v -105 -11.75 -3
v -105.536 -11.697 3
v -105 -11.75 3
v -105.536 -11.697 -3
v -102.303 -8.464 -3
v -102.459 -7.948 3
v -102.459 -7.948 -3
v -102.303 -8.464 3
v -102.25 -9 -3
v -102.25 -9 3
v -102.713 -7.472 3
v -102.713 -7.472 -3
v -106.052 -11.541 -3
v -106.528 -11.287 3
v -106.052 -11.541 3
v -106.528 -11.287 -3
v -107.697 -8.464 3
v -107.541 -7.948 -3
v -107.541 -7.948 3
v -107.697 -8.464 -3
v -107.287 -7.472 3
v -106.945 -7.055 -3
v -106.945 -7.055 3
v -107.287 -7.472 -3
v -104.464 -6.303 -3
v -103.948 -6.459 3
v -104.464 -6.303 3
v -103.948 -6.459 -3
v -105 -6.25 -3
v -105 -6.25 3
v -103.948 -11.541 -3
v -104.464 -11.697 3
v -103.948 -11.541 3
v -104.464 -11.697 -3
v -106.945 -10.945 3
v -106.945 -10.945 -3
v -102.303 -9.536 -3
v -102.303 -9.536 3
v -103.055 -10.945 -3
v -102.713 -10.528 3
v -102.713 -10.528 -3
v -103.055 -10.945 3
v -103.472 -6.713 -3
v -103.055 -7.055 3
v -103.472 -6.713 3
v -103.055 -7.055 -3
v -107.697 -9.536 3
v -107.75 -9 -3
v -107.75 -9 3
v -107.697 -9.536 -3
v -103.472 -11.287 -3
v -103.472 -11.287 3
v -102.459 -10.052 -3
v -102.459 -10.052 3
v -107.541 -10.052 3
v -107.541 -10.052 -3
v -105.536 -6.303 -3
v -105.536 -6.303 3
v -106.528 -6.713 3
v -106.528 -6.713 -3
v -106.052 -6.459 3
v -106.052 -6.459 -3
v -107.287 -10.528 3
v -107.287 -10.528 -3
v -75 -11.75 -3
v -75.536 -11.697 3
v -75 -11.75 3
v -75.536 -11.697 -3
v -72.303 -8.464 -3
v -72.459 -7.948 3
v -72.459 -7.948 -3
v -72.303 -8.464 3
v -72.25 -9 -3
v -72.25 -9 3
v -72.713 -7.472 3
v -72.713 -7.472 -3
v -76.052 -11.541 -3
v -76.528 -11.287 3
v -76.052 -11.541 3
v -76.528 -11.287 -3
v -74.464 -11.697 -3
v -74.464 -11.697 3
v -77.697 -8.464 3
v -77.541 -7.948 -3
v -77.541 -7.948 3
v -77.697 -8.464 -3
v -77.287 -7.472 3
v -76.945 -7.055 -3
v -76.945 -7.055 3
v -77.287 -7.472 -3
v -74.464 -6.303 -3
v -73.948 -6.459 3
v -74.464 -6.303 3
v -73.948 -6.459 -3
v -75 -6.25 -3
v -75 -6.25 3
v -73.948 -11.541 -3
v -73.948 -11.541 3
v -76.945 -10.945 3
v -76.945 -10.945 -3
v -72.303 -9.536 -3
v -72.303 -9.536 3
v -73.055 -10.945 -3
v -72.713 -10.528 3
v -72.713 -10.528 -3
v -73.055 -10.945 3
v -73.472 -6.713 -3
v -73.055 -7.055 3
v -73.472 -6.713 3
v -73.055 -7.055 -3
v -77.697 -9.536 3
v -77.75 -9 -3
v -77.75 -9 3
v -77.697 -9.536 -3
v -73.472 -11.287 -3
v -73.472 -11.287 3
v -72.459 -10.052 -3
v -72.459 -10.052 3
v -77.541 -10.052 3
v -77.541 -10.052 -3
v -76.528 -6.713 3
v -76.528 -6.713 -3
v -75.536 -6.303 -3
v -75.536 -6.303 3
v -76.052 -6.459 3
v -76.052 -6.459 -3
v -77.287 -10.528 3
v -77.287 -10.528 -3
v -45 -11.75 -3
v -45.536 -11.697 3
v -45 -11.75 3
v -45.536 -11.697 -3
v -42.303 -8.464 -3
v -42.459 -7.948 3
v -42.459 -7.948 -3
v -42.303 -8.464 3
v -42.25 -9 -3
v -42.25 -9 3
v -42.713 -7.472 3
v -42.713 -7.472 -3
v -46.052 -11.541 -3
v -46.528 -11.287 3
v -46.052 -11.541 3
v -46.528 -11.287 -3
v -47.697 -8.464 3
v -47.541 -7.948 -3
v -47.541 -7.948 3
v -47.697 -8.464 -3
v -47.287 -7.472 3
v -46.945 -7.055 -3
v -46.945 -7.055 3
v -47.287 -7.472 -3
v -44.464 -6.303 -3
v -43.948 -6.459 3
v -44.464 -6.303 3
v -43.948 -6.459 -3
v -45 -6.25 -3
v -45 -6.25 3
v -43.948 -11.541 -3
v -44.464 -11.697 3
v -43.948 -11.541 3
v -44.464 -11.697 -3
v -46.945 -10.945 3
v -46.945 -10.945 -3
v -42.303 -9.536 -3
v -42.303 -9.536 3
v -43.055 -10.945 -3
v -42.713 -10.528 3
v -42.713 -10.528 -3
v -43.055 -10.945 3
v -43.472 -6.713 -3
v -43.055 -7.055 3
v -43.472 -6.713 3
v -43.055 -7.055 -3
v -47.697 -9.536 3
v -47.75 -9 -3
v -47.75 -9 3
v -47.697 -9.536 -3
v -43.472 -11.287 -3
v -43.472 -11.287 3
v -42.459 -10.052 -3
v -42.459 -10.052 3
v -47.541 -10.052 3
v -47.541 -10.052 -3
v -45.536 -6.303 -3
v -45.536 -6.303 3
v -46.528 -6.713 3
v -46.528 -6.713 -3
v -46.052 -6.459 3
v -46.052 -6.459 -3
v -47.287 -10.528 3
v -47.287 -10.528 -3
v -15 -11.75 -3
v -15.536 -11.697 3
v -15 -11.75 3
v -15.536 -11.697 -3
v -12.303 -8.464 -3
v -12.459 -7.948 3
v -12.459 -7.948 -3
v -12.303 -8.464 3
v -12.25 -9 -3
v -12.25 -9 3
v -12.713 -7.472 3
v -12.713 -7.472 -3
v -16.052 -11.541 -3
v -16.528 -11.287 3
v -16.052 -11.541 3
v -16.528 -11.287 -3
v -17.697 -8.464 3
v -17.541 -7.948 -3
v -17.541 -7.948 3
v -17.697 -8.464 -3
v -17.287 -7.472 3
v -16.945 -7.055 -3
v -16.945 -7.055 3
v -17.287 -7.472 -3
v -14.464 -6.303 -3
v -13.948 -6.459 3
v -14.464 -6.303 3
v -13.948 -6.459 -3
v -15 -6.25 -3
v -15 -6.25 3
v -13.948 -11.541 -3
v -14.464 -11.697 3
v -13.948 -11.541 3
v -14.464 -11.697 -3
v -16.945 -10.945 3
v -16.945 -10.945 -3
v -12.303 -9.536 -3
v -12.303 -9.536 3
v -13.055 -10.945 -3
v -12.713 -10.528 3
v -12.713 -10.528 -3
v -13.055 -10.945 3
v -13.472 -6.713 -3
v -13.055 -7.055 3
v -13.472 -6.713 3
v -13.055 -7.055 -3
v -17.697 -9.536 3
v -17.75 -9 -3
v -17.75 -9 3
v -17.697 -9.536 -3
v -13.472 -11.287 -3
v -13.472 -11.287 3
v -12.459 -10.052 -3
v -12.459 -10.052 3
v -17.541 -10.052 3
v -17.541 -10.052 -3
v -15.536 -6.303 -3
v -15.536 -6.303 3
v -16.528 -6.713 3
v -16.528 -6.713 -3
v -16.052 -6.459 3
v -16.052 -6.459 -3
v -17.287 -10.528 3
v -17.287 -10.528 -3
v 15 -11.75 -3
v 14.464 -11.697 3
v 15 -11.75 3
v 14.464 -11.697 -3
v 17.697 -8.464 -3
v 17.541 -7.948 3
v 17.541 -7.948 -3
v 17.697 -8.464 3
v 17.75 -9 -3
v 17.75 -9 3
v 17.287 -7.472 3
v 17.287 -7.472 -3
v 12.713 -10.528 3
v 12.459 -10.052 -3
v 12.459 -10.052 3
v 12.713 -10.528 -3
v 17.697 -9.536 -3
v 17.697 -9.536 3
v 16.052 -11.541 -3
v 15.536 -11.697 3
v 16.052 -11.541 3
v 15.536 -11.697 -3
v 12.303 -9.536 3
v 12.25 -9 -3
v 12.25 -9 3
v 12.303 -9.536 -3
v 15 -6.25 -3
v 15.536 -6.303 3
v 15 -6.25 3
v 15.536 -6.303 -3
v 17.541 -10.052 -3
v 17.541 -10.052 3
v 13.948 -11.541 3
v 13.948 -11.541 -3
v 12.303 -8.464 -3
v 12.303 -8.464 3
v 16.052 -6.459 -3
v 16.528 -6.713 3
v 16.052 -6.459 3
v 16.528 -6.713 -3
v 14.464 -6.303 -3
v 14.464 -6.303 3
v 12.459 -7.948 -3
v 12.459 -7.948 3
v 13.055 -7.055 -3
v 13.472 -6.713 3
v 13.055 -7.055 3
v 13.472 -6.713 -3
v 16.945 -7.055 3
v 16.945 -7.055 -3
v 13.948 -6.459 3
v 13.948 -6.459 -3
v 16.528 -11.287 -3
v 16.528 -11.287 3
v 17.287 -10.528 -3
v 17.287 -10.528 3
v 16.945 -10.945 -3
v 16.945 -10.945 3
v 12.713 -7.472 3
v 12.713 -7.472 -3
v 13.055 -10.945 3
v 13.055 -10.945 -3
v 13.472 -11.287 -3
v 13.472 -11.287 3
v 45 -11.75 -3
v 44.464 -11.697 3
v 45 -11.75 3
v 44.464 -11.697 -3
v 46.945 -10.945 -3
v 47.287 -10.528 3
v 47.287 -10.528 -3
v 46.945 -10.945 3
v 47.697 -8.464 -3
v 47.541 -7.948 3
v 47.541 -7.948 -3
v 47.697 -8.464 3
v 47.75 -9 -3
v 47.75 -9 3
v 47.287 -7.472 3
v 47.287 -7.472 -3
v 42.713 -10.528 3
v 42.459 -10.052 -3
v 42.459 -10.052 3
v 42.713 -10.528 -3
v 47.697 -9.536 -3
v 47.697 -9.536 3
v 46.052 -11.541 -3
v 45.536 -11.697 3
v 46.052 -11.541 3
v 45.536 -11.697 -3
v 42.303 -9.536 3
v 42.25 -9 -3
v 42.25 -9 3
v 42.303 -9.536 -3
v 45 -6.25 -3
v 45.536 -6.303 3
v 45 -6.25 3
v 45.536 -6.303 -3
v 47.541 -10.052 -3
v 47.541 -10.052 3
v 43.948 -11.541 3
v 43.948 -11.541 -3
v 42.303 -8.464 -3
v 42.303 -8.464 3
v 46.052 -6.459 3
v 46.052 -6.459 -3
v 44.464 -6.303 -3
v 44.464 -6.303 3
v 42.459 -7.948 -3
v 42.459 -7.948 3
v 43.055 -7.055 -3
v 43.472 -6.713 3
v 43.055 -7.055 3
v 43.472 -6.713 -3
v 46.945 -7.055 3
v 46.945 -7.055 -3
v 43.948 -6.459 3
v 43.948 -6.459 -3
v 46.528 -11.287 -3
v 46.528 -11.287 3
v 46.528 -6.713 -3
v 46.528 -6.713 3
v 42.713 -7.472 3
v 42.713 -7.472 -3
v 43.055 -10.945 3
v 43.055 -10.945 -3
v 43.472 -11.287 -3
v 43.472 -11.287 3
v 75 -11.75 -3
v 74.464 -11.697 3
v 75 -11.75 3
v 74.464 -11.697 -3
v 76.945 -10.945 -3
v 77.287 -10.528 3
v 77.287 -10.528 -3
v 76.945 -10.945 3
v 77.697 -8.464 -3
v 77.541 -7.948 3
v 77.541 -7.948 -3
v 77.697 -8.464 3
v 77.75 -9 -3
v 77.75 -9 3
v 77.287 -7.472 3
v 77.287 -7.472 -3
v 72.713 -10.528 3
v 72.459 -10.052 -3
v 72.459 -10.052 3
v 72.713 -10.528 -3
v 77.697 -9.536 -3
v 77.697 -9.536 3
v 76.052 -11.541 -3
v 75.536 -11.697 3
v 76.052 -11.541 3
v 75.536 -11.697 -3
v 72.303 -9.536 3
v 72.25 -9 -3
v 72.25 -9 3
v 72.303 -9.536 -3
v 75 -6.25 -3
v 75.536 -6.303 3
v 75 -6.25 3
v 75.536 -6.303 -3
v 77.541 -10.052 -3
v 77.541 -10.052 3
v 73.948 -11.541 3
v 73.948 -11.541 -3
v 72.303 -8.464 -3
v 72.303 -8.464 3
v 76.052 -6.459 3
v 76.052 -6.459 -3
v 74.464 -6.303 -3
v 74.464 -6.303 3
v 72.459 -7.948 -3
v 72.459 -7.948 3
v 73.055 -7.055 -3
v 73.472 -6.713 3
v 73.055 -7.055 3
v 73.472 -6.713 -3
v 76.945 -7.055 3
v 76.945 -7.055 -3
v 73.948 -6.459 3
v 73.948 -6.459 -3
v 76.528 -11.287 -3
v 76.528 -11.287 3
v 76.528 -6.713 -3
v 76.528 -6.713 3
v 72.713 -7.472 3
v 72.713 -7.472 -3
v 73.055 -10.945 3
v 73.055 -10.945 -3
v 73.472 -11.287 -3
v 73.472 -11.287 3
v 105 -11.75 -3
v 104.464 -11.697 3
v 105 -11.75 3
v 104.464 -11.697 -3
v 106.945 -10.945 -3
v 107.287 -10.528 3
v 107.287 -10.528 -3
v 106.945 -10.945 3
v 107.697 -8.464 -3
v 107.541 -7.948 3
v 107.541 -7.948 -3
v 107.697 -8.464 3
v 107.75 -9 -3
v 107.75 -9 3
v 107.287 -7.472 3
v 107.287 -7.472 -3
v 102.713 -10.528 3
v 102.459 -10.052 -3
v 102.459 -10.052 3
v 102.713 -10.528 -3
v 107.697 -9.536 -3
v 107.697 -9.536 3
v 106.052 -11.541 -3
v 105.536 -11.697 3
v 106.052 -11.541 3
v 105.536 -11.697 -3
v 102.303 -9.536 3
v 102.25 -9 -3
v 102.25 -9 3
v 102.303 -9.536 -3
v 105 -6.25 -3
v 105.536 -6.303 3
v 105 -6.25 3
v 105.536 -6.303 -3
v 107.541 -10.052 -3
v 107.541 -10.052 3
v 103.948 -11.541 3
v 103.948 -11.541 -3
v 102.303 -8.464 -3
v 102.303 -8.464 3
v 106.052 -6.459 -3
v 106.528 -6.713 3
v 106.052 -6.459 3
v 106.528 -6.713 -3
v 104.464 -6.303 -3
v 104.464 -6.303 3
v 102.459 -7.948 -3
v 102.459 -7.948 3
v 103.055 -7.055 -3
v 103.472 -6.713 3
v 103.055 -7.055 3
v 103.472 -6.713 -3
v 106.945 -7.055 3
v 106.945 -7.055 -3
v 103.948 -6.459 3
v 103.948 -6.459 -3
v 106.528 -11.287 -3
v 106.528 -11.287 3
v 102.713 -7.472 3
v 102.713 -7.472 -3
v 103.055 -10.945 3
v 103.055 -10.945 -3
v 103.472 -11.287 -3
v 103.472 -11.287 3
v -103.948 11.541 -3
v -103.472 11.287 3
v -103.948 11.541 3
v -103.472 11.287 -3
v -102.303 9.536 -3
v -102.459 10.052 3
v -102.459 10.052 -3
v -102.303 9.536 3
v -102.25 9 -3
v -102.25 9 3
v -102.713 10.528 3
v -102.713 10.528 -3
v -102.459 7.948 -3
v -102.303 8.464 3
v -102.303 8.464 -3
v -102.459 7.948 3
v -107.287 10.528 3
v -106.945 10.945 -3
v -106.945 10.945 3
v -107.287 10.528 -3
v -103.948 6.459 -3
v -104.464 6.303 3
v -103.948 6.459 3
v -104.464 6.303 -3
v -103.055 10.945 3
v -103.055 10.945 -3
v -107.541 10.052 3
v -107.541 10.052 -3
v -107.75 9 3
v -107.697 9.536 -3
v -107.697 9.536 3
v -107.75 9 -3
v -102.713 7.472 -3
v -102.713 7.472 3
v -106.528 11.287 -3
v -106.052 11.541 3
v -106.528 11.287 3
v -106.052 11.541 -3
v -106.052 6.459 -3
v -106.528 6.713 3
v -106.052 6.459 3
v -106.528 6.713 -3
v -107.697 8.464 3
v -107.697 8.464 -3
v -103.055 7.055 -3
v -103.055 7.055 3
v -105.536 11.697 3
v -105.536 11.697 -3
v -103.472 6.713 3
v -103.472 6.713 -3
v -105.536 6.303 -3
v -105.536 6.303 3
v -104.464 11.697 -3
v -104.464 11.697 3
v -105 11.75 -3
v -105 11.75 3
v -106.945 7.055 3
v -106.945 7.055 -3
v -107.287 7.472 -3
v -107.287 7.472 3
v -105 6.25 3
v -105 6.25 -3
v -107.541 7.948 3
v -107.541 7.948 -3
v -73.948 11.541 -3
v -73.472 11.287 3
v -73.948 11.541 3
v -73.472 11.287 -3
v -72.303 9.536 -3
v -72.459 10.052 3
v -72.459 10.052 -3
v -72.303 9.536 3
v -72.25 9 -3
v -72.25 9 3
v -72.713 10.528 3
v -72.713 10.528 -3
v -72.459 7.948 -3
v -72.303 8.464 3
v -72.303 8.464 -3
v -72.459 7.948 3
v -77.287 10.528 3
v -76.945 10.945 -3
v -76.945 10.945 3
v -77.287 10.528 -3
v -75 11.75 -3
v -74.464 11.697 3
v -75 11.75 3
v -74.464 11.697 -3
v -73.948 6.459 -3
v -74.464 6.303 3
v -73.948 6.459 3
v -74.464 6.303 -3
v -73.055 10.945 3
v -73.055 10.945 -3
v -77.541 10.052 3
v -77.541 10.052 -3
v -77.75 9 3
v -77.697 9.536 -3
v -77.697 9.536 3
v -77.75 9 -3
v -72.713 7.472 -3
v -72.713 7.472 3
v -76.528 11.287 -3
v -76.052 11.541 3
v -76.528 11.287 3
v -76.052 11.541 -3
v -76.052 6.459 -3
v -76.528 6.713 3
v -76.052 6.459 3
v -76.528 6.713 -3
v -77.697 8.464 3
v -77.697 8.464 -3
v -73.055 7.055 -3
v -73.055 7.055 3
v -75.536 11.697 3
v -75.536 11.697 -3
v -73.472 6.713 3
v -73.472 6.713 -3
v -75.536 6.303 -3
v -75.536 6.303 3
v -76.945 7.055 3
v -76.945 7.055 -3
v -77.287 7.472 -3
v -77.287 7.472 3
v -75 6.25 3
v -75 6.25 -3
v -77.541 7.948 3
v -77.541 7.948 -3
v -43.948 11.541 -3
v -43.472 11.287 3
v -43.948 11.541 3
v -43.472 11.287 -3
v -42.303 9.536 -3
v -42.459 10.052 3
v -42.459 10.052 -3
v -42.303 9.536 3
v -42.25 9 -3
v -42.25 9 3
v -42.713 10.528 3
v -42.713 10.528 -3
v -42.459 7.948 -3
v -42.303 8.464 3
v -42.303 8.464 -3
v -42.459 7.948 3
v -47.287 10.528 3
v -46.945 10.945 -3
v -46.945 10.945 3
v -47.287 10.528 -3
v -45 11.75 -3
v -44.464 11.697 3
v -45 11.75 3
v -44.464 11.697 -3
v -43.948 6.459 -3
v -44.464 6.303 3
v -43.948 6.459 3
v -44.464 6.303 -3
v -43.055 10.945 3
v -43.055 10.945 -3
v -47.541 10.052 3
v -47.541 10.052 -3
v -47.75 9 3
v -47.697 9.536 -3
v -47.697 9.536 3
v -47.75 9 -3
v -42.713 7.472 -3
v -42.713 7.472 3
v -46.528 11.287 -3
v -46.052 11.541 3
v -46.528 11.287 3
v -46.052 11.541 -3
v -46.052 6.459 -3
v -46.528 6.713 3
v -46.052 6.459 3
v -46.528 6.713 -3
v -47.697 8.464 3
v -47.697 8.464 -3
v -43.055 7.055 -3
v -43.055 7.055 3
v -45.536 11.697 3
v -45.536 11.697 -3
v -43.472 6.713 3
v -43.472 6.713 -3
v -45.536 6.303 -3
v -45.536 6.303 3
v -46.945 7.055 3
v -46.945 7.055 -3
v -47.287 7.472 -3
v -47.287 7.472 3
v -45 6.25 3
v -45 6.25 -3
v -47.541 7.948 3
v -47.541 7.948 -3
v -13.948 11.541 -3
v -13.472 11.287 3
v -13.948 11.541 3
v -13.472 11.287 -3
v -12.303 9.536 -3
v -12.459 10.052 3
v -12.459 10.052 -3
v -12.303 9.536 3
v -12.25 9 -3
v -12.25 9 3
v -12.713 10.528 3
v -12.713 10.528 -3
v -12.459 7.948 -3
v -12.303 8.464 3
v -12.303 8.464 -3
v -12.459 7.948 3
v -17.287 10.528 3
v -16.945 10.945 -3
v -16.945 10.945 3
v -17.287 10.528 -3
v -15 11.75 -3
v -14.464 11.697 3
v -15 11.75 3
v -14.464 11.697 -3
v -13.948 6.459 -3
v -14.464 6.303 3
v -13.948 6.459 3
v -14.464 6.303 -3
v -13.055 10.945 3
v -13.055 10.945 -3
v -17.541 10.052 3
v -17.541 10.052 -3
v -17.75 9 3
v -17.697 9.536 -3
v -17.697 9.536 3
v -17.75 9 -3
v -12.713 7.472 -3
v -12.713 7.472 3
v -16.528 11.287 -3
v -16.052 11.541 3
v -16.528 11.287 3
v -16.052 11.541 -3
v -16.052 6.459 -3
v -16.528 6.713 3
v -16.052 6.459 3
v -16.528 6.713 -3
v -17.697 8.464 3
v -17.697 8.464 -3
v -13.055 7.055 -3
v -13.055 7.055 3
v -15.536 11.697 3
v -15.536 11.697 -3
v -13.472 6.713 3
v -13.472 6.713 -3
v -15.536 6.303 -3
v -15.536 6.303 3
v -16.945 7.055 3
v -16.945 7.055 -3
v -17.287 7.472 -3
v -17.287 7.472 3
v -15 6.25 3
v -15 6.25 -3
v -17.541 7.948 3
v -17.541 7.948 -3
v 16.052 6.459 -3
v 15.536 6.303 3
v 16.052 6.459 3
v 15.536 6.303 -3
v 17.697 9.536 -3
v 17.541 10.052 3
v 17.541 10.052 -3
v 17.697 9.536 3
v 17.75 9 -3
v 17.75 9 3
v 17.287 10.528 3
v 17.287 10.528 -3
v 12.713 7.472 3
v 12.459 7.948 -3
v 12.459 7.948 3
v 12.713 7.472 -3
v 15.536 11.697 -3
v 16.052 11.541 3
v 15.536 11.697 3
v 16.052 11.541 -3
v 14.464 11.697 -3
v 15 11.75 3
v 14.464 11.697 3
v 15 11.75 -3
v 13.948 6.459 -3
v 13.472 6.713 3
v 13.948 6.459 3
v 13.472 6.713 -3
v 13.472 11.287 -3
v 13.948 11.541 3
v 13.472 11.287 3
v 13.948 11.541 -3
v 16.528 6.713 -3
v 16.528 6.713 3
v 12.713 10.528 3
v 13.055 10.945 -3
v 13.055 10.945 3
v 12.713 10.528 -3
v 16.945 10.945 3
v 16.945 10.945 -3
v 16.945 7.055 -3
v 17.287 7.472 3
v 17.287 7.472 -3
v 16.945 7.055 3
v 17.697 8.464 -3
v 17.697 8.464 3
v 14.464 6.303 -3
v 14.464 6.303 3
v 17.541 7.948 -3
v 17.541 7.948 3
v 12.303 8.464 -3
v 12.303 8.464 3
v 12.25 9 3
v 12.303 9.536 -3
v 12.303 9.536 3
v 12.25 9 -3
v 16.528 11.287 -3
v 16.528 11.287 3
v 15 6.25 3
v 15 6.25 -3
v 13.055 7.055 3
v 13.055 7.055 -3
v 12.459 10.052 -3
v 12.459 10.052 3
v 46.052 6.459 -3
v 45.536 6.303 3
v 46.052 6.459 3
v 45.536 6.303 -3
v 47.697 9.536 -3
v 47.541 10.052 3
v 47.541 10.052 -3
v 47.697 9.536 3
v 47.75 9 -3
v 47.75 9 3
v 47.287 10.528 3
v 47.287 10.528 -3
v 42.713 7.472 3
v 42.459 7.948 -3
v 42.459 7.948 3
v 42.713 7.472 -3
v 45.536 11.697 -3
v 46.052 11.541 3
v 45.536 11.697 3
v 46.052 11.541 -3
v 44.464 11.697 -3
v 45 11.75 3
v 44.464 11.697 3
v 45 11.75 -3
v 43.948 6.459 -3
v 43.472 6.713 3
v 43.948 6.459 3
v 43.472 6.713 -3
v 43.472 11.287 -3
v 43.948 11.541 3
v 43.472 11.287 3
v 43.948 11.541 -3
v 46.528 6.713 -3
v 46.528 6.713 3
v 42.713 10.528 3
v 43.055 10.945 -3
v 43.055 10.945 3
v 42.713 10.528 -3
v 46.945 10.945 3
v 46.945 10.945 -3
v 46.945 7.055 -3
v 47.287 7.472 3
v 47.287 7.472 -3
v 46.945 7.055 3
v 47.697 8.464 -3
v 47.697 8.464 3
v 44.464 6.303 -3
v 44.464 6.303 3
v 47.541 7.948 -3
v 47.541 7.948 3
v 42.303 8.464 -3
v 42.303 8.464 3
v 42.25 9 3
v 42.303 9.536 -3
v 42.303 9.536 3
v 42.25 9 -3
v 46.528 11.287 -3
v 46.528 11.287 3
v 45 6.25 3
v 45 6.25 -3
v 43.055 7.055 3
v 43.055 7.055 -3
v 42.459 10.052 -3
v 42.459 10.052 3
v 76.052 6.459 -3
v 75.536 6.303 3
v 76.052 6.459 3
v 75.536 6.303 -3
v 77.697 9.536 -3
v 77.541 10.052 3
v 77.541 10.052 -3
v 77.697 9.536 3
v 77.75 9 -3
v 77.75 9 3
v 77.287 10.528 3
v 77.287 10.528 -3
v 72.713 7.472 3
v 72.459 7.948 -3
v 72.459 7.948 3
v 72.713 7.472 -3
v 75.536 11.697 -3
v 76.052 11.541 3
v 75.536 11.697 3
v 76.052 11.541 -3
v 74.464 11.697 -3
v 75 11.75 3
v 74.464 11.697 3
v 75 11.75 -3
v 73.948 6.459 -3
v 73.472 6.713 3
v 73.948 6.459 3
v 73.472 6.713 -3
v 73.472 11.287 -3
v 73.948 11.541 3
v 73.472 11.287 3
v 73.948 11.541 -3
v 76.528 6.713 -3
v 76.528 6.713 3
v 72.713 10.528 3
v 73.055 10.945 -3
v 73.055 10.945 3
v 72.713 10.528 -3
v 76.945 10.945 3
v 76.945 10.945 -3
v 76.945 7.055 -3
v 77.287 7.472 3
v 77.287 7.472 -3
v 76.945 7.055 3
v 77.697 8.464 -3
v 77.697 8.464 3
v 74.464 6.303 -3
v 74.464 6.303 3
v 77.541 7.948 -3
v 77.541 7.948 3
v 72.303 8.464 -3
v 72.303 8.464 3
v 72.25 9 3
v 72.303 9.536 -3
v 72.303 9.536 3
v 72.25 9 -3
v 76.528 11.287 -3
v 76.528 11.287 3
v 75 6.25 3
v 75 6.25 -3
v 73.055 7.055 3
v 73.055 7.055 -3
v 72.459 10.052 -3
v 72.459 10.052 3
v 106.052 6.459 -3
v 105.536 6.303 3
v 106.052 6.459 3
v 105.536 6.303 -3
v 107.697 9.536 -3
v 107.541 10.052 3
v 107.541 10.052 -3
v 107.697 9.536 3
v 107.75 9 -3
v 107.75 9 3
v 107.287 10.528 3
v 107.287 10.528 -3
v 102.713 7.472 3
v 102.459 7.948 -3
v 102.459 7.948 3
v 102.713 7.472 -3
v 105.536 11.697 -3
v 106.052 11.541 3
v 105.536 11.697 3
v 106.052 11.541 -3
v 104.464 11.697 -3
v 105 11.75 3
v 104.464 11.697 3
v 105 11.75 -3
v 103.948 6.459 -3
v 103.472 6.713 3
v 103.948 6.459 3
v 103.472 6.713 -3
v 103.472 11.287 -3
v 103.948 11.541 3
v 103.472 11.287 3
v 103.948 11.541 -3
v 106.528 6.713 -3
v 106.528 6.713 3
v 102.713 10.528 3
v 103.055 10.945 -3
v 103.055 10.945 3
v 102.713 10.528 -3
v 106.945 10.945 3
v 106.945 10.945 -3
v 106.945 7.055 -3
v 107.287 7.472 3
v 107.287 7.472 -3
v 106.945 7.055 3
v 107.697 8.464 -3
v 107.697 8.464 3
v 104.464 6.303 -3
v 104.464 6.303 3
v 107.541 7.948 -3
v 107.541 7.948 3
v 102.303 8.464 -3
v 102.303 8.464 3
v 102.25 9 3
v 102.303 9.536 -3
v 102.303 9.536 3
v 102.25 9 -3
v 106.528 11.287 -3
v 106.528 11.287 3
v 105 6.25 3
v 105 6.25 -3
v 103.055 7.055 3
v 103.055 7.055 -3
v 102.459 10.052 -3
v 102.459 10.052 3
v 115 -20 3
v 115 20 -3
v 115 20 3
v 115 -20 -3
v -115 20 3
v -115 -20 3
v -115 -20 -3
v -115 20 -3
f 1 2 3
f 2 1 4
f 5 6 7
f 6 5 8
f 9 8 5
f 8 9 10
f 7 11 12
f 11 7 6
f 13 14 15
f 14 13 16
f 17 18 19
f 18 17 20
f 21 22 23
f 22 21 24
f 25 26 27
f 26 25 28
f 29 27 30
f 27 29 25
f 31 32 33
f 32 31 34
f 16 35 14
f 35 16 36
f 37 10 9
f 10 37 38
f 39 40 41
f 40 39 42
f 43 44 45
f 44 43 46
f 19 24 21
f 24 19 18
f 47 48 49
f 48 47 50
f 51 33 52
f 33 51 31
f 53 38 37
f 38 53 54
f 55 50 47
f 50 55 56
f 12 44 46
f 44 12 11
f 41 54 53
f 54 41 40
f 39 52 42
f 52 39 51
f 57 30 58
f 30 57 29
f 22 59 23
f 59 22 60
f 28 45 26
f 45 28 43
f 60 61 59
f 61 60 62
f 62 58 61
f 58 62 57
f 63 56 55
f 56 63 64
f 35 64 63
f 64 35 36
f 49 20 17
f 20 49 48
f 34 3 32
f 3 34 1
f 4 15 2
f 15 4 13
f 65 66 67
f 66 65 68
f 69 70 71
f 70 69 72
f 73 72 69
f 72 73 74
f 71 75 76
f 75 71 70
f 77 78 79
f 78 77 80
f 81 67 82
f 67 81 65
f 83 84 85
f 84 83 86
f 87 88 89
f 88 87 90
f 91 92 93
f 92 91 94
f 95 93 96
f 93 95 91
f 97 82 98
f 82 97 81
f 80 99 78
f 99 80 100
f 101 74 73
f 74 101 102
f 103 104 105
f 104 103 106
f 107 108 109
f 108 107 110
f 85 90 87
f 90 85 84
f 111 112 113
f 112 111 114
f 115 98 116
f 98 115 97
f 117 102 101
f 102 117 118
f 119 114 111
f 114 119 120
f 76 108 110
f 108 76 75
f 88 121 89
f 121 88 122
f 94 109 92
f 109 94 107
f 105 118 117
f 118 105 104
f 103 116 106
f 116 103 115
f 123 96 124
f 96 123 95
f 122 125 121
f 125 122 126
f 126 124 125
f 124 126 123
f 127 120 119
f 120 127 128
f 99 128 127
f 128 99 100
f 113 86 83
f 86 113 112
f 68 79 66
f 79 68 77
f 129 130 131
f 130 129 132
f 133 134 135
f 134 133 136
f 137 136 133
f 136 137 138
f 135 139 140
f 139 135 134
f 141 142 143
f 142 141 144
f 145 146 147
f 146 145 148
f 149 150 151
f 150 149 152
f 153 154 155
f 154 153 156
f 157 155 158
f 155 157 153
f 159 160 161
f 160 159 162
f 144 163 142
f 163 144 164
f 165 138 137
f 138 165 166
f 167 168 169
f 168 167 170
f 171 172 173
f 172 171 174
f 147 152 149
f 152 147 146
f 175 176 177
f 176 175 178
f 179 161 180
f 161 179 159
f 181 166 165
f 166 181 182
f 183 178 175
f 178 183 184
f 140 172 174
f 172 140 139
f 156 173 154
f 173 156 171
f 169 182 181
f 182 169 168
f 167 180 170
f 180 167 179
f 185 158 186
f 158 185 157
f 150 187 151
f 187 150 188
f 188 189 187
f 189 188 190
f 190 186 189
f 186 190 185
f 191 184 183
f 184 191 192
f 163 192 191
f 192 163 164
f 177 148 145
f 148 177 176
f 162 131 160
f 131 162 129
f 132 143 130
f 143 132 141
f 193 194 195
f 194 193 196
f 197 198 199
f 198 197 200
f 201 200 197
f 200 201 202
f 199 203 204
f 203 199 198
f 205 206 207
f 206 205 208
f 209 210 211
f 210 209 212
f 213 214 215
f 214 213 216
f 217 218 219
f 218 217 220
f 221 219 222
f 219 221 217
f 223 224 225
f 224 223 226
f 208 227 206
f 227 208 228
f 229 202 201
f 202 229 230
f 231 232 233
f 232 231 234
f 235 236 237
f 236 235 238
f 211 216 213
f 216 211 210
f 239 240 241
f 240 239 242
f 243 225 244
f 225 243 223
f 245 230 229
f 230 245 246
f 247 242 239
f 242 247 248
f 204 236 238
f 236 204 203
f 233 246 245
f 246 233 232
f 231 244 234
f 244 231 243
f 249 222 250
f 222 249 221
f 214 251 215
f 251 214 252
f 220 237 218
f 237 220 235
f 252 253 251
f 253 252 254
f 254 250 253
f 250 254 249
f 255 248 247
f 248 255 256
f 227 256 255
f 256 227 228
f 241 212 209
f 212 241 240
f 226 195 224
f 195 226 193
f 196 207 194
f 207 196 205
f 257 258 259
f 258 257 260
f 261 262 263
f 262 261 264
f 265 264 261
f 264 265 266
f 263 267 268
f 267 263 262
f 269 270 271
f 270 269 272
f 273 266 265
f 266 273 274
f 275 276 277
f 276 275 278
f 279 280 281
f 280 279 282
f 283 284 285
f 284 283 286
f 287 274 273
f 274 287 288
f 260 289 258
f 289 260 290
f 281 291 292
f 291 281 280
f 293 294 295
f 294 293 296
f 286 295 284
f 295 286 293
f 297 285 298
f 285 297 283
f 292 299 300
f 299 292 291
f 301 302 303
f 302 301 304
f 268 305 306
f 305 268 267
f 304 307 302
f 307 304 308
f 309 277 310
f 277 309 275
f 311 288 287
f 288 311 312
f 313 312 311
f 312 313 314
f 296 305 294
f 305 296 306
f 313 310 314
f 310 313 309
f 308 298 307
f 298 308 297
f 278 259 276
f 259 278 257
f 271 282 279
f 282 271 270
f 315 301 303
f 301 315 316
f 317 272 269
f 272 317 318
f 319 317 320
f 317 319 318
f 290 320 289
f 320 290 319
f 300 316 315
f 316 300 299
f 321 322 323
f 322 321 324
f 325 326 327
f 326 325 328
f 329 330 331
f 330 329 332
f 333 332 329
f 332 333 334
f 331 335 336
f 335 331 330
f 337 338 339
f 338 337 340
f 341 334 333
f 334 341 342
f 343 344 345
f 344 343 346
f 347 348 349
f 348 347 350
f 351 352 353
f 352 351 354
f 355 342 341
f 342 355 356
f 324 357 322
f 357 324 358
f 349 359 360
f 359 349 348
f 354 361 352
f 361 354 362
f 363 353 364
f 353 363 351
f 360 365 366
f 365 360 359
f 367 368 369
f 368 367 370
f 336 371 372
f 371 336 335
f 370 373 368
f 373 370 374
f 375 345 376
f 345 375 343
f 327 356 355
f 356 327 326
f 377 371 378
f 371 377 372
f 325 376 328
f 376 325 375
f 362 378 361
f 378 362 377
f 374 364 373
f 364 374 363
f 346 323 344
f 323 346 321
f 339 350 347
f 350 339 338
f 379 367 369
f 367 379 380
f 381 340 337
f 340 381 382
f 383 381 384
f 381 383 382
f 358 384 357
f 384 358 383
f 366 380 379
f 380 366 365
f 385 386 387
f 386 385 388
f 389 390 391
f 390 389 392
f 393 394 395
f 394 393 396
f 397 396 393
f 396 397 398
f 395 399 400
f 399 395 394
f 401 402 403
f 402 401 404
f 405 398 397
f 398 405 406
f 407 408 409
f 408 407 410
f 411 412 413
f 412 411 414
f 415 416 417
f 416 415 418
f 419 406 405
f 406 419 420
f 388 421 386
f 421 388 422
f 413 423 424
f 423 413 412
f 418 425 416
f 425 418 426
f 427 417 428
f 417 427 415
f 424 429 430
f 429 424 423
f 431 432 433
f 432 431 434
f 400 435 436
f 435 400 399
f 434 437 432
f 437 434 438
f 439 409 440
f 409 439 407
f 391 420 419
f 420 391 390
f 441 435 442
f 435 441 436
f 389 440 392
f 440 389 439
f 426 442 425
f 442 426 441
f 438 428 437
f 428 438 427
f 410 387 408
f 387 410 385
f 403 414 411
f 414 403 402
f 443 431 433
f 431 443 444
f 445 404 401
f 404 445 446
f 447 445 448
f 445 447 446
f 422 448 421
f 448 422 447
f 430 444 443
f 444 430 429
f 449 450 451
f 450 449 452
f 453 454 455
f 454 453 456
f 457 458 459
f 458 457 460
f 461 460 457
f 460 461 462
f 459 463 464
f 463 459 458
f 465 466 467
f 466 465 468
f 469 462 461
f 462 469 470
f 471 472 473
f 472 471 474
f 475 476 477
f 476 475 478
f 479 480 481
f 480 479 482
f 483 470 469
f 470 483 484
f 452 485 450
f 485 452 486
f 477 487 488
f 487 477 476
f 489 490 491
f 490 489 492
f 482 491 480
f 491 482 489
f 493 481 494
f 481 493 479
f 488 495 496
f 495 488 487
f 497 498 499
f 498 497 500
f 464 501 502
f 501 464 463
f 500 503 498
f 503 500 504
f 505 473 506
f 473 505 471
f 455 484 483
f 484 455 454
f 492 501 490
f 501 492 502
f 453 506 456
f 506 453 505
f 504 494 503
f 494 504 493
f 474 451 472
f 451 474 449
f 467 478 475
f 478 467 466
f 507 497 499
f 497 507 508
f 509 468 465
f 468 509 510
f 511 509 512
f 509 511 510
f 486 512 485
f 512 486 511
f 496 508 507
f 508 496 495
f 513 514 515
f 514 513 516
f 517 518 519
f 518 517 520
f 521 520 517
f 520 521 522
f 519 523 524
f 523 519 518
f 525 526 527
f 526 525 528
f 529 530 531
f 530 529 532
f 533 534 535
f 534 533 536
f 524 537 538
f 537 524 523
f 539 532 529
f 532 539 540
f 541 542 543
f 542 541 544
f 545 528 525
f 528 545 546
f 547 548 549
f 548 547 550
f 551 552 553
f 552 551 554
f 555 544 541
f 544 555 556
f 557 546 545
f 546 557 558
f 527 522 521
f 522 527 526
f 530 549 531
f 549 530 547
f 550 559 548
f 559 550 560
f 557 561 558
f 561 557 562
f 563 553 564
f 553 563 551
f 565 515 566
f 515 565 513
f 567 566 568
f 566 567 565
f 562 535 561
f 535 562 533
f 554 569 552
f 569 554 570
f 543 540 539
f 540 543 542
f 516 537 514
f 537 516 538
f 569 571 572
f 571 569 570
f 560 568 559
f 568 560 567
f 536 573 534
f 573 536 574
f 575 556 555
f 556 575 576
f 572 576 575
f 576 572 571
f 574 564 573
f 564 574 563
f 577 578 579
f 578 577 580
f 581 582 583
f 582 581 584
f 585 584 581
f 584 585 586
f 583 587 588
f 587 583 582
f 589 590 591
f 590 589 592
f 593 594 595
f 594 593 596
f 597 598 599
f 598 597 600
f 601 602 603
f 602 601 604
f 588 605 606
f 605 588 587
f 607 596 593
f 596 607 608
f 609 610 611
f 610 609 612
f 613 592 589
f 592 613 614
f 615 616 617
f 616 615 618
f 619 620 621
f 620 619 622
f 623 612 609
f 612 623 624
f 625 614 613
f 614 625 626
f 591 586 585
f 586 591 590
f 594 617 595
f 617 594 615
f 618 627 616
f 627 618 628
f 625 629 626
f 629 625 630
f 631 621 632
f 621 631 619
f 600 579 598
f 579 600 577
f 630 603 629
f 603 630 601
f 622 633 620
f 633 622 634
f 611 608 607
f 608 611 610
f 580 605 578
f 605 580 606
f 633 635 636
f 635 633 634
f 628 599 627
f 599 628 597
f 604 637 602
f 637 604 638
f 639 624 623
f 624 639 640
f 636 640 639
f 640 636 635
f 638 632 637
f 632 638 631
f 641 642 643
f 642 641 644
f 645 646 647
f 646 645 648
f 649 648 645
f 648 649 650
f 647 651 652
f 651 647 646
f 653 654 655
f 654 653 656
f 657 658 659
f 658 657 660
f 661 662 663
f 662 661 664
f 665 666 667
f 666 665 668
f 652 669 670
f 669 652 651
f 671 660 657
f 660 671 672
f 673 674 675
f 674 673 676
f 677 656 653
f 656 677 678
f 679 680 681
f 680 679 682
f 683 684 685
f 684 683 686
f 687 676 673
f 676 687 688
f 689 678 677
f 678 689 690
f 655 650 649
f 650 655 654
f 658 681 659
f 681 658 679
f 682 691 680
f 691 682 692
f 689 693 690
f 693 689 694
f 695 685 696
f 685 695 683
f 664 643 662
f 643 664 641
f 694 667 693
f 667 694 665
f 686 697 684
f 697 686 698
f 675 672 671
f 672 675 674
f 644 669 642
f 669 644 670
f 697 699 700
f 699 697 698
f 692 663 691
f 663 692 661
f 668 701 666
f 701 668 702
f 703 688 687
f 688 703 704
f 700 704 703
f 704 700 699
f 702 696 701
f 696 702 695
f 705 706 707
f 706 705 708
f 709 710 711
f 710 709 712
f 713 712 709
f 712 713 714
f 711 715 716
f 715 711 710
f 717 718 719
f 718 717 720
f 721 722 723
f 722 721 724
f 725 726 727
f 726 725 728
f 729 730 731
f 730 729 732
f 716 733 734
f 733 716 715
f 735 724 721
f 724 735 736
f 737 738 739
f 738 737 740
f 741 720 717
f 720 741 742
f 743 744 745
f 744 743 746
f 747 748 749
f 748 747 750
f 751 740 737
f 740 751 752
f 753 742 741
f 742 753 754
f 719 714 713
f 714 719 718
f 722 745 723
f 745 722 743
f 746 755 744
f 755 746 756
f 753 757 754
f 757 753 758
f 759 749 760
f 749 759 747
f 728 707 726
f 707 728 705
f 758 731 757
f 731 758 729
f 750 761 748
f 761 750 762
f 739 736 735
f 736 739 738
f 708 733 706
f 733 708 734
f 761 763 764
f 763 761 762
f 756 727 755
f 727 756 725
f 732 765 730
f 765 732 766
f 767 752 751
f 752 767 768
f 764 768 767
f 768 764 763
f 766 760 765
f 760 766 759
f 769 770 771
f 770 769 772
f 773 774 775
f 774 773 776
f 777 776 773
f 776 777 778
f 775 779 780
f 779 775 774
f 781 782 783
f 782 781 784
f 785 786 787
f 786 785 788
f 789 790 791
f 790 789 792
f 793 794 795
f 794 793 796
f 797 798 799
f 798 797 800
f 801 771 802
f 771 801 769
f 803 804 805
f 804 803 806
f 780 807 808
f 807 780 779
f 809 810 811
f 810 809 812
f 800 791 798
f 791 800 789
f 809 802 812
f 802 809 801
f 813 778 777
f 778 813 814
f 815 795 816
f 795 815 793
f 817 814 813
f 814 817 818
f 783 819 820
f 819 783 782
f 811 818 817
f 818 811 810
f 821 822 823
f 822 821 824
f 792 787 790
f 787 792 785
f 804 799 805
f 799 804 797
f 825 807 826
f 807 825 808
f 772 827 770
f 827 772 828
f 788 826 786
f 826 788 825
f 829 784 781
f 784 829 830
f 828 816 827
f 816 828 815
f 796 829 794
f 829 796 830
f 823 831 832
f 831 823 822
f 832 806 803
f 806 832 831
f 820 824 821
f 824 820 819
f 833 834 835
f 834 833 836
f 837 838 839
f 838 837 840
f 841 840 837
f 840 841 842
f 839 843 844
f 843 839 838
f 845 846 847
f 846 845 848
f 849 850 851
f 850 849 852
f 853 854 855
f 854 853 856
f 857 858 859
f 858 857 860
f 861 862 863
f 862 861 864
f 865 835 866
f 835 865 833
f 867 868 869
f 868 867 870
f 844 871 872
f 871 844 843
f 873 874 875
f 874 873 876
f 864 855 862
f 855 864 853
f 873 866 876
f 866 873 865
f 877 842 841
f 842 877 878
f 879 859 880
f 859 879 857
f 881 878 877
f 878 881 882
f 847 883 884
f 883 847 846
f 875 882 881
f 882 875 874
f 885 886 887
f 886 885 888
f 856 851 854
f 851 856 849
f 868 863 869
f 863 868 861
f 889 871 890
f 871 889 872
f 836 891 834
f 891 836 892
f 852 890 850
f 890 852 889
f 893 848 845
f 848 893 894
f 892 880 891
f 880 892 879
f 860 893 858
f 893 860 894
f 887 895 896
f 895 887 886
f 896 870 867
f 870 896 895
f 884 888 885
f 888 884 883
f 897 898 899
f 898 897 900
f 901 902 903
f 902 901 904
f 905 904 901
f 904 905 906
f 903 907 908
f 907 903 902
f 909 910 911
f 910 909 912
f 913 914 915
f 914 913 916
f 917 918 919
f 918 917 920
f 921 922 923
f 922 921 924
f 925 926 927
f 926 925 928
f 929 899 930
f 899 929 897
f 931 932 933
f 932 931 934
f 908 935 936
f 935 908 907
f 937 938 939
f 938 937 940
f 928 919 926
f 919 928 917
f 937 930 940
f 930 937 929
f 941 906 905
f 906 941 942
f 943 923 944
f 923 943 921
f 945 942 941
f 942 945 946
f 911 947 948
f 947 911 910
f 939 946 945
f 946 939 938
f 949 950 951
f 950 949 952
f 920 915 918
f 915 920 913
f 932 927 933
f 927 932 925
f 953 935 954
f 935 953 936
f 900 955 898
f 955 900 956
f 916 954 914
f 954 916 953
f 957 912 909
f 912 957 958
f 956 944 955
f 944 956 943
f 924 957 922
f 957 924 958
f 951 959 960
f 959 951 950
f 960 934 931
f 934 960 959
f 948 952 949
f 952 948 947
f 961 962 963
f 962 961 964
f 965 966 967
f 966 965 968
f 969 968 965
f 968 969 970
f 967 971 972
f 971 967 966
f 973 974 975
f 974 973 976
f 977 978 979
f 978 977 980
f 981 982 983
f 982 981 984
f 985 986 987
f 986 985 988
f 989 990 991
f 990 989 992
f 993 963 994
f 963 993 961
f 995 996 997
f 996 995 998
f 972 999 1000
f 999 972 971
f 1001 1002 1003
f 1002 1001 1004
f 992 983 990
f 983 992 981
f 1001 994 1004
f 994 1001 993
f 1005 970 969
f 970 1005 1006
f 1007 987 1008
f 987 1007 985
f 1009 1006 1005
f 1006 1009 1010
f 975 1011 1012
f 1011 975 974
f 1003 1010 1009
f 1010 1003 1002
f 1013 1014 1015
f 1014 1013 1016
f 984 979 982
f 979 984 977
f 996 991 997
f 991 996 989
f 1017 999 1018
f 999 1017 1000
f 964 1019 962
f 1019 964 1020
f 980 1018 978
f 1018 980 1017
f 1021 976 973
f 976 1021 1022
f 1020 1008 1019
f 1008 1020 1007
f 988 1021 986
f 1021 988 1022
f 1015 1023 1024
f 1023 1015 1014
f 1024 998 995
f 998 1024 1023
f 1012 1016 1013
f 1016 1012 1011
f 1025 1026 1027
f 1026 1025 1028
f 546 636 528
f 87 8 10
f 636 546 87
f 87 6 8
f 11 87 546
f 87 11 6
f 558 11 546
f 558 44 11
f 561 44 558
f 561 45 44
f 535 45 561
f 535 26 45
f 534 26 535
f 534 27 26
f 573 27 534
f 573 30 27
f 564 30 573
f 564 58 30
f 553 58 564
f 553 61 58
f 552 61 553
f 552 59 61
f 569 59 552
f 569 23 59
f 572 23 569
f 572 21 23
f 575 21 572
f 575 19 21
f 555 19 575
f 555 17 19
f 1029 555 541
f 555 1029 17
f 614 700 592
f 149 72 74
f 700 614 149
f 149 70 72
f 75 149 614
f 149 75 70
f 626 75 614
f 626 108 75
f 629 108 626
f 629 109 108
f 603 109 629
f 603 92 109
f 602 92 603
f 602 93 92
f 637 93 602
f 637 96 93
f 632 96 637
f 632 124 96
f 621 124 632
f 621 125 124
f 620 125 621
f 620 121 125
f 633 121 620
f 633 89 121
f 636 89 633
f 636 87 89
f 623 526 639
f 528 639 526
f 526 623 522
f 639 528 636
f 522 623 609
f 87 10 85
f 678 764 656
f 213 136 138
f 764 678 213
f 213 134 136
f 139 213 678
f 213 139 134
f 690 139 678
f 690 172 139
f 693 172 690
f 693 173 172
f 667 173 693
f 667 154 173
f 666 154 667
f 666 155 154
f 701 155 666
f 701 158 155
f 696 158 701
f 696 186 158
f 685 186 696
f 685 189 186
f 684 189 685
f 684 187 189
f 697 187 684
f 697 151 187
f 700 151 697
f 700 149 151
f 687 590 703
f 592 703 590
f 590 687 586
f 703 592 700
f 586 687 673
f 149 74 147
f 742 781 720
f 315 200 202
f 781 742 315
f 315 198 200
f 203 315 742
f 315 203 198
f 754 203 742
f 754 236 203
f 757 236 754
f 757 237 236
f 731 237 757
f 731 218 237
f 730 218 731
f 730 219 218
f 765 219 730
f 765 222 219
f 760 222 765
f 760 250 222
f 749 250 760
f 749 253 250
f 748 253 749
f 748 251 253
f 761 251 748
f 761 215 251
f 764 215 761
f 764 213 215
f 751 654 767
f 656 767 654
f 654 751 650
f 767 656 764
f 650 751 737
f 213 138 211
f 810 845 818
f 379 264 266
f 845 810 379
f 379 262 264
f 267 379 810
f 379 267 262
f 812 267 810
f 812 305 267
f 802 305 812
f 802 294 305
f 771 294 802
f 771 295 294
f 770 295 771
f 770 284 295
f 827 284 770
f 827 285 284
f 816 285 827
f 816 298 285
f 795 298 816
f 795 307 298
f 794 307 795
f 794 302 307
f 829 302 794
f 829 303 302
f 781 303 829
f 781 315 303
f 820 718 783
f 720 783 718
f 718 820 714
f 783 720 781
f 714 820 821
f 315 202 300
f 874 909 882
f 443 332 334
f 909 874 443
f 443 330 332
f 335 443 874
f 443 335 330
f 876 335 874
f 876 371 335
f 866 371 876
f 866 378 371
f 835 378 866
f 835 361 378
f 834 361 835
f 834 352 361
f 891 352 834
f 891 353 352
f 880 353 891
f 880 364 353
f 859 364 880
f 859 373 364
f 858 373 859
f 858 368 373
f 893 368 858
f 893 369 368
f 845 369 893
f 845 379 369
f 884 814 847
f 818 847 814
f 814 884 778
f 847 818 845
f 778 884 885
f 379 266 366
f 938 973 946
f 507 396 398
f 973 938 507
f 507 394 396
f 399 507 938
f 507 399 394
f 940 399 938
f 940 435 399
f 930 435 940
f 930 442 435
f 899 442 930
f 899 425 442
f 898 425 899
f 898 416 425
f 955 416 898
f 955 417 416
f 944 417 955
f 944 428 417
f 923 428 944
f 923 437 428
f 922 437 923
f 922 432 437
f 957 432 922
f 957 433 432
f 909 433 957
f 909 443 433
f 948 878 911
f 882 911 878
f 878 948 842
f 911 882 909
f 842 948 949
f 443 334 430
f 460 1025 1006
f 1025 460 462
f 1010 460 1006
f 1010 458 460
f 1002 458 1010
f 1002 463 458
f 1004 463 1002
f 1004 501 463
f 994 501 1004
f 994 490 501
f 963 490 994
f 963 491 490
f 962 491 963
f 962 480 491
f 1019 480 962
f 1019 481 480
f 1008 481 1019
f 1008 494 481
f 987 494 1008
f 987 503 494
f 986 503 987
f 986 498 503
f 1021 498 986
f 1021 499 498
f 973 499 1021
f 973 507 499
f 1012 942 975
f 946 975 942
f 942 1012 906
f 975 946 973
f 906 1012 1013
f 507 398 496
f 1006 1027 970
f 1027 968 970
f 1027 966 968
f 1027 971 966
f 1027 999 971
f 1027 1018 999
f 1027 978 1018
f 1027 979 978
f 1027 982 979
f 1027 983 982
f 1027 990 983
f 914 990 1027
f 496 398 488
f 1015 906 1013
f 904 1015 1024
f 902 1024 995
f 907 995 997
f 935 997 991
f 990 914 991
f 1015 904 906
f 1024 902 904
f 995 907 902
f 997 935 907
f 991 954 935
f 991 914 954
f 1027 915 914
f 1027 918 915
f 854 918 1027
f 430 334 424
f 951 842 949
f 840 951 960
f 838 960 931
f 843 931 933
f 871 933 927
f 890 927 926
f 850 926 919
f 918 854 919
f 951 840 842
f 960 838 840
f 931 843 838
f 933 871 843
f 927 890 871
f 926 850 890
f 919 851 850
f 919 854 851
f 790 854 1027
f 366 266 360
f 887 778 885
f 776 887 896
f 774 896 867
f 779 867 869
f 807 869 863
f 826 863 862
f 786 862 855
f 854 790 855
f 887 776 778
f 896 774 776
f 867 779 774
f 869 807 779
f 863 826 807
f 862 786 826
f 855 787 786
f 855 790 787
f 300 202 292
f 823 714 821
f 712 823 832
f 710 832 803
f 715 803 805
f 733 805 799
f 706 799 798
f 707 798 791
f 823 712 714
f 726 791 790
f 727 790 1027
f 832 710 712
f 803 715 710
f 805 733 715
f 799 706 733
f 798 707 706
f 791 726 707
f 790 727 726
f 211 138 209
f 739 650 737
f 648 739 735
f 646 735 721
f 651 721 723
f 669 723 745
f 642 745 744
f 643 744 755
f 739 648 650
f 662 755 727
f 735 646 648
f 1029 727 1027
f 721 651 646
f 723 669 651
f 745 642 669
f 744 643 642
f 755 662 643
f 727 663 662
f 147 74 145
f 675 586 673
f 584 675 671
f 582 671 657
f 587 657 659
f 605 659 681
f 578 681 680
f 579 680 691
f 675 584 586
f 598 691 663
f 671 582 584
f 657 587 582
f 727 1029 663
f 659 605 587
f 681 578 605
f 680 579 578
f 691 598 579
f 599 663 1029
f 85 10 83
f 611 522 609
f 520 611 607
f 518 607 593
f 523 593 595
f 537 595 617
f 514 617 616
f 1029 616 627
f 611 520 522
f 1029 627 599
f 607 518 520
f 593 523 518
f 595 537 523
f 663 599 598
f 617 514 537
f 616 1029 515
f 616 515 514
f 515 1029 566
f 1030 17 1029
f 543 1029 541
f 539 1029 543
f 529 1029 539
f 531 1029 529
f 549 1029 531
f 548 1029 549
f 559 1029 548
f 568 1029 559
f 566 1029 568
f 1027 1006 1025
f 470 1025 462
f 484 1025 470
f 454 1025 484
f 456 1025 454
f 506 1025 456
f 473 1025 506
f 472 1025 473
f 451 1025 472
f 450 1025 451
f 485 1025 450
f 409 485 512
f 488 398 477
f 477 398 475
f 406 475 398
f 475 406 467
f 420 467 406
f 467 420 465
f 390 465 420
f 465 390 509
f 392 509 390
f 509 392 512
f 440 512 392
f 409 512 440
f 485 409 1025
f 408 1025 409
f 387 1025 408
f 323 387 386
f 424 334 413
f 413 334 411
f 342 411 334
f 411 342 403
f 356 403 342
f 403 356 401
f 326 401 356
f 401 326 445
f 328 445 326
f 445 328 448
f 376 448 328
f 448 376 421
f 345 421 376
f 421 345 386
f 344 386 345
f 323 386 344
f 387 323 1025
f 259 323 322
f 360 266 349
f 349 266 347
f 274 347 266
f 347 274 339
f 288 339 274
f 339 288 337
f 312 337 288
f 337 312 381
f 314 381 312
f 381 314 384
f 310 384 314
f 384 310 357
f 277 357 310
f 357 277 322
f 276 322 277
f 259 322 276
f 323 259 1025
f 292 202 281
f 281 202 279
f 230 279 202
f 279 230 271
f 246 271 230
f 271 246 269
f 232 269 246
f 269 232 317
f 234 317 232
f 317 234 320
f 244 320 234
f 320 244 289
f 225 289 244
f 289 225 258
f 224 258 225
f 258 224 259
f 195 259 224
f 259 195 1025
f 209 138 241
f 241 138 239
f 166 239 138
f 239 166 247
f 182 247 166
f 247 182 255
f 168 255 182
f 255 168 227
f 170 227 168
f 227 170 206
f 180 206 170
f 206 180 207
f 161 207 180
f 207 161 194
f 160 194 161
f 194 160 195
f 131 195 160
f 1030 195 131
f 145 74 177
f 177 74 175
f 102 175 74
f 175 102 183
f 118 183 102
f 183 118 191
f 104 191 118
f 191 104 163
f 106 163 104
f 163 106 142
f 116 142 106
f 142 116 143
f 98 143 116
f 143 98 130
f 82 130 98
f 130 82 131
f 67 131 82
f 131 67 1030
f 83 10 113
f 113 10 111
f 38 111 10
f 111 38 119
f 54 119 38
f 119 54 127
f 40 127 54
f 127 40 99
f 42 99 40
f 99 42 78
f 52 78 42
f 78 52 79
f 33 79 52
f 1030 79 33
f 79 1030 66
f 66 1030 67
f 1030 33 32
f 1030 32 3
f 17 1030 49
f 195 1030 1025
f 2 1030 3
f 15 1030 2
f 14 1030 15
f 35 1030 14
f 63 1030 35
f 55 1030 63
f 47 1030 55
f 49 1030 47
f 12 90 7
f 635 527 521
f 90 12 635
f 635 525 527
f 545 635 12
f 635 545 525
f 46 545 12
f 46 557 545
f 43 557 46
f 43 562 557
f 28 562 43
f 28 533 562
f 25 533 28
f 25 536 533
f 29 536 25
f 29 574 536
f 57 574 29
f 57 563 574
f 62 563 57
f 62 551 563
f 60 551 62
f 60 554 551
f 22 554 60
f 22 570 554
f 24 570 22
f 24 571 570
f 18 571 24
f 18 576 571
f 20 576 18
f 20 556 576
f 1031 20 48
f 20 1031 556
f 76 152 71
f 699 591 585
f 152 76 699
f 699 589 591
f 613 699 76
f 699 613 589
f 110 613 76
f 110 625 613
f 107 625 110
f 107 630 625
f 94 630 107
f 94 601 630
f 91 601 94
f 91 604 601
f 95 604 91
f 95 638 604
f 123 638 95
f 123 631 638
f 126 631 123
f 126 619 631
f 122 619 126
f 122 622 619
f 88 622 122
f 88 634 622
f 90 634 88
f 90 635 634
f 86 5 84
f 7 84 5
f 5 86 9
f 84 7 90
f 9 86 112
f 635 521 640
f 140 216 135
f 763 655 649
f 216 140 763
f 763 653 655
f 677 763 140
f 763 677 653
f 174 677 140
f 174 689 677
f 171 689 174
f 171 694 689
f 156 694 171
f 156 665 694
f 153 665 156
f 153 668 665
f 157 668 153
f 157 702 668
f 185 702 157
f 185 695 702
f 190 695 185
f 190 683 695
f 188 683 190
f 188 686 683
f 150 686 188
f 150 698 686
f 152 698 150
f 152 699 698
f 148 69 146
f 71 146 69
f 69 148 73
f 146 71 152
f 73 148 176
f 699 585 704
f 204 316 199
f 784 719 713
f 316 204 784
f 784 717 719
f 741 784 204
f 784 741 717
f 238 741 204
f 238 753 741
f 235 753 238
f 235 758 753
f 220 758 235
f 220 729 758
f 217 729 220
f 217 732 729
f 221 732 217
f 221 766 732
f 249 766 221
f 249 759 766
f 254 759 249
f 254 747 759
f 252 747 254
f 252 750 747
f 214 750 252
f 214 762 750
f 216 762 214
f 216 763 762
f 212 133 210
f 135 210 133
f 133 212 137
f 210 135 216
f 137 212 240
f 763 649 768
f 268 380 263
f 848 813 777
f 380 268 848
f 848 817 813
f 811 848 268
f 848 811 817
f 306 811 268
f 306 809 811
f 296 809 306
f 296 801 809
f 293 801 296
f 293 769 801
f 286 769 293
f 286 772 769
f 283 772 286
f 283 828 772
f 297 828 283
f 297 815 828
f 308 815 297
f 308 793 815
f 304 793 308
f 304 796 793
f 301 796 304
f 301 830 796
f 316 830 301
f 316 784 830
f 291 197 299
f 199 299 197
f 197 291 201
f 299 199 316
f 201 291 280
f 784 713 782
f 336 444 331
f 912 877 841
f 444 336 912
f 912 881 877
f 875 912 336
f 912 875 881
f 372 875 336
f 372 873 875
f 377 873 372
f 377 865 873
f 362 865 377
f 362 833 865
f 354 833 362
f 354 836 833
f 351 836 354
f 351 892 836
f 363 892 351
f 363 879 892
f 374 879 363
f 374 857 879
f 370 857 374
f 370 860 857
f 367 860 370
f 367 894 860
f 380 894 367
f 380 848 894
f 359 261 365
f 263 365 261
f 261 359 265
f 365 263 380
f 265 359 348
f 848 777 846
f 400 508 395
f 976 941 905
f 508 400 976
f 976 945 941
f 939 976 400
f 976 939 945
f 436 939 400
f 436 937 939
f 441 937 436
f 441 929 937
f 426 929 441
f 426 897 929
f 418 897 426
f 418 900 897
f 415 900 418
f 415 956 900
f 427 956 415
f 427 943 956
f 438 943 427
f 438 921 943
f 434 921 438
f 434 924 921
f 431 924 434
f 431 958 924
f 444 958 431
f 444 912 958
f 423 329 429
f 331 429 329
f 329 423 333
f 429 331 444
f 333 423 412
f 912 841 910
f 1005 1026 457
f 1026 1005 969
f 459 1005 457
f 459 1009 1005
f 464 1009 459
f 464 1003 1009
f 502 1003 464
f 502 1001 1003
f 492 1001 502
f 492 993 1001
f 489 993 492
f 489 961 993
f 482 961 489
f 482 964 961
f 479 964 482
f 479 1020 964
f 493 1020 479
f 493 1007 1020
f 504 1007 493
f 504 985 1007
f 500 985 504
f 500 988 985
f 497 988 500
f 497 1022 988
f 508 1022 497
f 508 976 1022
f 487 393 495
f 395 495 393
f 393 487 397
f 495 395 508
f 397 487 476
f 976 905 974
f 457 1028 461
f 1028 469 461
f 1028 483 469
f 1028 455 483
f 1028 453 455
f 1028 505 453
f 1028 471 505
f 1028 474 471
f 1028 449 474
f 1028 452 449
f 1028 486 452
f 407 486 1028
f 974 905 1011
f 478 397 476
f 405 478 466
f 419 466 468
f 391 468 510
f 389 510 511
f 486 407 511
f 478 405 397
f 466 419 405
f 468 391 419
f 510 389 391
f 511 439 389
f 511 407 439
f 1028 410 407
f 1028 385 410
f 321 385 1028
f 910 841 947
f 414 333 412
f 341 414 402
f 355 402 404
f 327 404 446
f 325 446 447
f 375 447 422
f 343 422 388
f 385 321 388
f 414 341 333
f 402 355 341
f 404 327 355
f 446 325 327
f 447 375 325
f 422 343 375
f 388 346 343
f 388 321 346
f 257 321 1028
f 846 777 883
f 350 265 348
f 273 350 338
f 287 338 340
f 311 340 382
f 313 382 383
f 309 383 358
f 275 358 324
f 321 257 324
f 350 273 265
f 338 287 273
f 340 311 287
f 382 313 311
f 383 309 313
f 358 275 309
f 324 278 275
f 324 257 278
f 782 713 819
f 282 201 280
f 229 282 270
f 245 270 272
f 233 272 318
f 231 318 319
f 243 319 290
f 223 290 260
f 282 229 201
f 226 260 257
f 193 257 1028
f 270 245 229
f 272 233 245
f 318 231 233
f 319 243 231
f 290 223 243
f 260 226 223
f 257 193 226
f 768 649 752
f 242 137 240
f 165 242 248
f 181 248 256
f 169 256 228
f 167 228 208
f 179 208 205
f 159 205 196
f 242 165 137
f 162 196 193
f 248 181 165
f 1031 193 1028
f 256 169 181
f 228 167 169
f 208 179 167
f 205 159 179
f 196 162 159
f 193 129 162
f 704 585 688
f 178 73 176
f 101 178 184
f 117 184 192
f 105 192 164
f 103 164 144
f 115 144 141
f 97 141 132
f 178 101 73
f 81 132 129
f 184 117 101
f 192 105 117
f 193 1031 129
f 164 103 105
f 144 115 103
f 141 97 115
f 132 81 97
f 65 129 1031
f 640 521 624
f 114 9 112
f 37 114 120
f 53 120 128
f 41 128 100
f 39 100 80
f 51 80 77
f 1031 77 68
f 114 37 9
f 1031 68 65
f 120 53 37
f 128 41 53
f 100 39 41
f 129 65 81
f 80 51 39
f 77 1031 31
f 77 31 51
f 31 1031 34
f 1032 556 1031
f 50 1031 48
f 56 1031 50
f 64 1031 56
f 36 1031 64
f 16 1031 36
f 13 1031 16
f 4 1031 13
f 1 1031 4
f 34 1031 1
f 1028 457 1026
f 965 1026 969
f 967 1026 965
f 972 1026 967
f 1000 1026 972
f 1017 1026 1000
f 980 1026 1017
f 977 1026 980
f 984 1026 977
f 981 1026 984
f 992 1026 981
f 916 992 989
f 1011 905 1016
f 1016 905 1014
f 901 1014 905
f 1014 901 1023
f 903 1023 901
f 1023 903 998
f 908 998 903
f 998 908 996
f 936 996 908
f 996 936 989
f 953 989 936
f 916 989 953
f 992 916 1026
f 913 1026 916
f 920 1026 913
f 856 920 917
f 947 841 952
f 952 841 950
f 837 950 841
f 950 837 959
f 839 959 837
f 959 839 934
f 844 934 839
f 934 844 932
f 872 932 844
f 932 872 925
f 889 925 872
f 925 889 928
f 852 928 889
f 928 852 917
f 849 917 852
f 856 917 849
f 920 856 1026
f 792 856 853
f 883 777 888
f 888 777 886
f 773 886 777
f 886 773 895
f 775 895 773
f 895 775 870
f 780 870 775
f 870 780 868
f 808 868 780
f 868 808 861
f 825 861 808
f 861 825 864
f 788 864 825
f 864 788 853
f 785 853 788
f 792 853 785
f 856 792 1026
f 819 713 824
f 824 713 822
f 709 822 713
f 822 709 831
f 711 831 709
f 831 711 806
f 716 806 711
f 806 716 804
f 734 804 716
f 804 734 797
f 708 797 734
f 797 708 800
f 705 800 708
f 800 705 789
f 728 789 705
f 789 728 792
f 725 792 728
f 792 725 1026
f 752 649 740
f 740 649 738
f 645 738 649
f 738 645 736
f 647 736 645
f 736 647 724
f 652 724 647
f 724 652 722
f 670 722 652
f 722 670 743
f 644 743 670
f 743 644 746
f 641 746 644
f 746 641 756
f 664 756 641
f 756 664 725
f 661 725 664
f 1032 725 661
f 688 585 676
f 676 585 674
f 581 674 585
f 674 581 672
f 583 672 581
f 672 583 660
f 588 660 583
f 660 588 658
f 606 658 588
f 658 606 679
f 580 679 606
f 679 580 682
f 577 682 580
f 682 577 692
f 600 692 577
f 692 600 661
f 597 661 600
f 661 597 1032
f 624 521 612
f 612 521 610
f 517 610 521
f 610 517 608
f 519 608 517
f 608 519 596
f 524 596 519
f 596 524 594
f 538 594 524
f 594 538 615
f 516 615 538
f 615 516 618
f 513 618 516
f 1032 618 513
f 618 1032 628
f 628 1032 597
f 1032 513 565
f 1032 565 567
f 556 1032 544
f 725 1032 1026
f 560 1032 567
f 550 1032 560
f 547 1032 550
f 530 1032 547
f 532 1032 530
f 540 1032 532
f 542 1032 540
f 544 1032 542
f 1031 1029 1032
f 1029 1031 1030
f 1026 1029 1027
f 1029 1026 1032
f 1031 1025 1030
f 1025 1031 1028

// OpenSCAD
$fn = 32;

// ----------------------------------------------------------------------
// Hole bar, 8 x Ø5.5
// tworows layout, 10 mm edge offset
// ----------------------------------------------------------------------

// --- parameters (mm) ---
bar_w = 40;       // bar width (Y)
seat_tol = 0.05;  // tolerance at the seating features
free_tol = 0.3;   // general tolerance on the free sizes
bar_t = 6;        // bar thickness (Z)
holes = 8;        // holes per row
hole_d = 5.5;     // hole diameter
edge = 10;        // offset from the bar end to the first hole
pitch = 30;       // pitch between neighbouring holes
row_offset = 18;  // distance between the two rows

// --- derived feature positions (mm) ---
span = (holes - 1) * pitch;   // = 210   distance between the end holes
bar_l = span + 2 * edge;      // = 230   overall bar length
start_x = -bar_l / 2 + edge;  // = -105   X of the first hole
feature_centers = [
  [start_x + 0 * pitch, -row_offset / 2],
  [start_x + 1 * pitch, -row_offset / 2],
  [start_x + 2 * pitch, -row_offset / 2],
  [start_x + 3 * pitch, -row_offset / 2],
  [start_x + 4 * pitch, -row_offset / 2],
  [start_x + 5 * pitch, -row_offset / 2],
  [start_x + 6 * pitch, -row_offset / 2],
  [start_x + 7 * pitch, -row_offset / 2]
];   // hole centres of the first row
row2_centers = [
  [start_x + 0 * pitch, row_offset / 2],
  [start_x + 1 * pitch, row_offset / 2],
  [start_x + 2 * pitch, row_offset / 2],
  [start_x + 3 * pitch, row_offset / 2],
  [start_x + 4 * pitch, row_offset / 2],
  [start_x + 5 * pitch, row_offset / 2],
  [start_x + 6 * pitch, row_offset / 2],
  [start_x + 7 * pitch, row_offset / 2]
];   // hole centres of the second row

// bar with two rows of holes, both read from their own centre arrays
difference() {
  translate([-bar_l / 2, -bar_w / 2, -bar_t / 2]) cube([bar_l, bar_w, bar_t]);
  for (centre = feature_centers)
    translate([centre[0], centre[1], 0])
      cylinder(d = hole_d, h = bar_t + 2, center = true);
  for (centre = row2_centers)
    translate([centre[0], centre[1], 0])
      cylinder(d = hole_d, h = bar_t + 2, center = true);
}
